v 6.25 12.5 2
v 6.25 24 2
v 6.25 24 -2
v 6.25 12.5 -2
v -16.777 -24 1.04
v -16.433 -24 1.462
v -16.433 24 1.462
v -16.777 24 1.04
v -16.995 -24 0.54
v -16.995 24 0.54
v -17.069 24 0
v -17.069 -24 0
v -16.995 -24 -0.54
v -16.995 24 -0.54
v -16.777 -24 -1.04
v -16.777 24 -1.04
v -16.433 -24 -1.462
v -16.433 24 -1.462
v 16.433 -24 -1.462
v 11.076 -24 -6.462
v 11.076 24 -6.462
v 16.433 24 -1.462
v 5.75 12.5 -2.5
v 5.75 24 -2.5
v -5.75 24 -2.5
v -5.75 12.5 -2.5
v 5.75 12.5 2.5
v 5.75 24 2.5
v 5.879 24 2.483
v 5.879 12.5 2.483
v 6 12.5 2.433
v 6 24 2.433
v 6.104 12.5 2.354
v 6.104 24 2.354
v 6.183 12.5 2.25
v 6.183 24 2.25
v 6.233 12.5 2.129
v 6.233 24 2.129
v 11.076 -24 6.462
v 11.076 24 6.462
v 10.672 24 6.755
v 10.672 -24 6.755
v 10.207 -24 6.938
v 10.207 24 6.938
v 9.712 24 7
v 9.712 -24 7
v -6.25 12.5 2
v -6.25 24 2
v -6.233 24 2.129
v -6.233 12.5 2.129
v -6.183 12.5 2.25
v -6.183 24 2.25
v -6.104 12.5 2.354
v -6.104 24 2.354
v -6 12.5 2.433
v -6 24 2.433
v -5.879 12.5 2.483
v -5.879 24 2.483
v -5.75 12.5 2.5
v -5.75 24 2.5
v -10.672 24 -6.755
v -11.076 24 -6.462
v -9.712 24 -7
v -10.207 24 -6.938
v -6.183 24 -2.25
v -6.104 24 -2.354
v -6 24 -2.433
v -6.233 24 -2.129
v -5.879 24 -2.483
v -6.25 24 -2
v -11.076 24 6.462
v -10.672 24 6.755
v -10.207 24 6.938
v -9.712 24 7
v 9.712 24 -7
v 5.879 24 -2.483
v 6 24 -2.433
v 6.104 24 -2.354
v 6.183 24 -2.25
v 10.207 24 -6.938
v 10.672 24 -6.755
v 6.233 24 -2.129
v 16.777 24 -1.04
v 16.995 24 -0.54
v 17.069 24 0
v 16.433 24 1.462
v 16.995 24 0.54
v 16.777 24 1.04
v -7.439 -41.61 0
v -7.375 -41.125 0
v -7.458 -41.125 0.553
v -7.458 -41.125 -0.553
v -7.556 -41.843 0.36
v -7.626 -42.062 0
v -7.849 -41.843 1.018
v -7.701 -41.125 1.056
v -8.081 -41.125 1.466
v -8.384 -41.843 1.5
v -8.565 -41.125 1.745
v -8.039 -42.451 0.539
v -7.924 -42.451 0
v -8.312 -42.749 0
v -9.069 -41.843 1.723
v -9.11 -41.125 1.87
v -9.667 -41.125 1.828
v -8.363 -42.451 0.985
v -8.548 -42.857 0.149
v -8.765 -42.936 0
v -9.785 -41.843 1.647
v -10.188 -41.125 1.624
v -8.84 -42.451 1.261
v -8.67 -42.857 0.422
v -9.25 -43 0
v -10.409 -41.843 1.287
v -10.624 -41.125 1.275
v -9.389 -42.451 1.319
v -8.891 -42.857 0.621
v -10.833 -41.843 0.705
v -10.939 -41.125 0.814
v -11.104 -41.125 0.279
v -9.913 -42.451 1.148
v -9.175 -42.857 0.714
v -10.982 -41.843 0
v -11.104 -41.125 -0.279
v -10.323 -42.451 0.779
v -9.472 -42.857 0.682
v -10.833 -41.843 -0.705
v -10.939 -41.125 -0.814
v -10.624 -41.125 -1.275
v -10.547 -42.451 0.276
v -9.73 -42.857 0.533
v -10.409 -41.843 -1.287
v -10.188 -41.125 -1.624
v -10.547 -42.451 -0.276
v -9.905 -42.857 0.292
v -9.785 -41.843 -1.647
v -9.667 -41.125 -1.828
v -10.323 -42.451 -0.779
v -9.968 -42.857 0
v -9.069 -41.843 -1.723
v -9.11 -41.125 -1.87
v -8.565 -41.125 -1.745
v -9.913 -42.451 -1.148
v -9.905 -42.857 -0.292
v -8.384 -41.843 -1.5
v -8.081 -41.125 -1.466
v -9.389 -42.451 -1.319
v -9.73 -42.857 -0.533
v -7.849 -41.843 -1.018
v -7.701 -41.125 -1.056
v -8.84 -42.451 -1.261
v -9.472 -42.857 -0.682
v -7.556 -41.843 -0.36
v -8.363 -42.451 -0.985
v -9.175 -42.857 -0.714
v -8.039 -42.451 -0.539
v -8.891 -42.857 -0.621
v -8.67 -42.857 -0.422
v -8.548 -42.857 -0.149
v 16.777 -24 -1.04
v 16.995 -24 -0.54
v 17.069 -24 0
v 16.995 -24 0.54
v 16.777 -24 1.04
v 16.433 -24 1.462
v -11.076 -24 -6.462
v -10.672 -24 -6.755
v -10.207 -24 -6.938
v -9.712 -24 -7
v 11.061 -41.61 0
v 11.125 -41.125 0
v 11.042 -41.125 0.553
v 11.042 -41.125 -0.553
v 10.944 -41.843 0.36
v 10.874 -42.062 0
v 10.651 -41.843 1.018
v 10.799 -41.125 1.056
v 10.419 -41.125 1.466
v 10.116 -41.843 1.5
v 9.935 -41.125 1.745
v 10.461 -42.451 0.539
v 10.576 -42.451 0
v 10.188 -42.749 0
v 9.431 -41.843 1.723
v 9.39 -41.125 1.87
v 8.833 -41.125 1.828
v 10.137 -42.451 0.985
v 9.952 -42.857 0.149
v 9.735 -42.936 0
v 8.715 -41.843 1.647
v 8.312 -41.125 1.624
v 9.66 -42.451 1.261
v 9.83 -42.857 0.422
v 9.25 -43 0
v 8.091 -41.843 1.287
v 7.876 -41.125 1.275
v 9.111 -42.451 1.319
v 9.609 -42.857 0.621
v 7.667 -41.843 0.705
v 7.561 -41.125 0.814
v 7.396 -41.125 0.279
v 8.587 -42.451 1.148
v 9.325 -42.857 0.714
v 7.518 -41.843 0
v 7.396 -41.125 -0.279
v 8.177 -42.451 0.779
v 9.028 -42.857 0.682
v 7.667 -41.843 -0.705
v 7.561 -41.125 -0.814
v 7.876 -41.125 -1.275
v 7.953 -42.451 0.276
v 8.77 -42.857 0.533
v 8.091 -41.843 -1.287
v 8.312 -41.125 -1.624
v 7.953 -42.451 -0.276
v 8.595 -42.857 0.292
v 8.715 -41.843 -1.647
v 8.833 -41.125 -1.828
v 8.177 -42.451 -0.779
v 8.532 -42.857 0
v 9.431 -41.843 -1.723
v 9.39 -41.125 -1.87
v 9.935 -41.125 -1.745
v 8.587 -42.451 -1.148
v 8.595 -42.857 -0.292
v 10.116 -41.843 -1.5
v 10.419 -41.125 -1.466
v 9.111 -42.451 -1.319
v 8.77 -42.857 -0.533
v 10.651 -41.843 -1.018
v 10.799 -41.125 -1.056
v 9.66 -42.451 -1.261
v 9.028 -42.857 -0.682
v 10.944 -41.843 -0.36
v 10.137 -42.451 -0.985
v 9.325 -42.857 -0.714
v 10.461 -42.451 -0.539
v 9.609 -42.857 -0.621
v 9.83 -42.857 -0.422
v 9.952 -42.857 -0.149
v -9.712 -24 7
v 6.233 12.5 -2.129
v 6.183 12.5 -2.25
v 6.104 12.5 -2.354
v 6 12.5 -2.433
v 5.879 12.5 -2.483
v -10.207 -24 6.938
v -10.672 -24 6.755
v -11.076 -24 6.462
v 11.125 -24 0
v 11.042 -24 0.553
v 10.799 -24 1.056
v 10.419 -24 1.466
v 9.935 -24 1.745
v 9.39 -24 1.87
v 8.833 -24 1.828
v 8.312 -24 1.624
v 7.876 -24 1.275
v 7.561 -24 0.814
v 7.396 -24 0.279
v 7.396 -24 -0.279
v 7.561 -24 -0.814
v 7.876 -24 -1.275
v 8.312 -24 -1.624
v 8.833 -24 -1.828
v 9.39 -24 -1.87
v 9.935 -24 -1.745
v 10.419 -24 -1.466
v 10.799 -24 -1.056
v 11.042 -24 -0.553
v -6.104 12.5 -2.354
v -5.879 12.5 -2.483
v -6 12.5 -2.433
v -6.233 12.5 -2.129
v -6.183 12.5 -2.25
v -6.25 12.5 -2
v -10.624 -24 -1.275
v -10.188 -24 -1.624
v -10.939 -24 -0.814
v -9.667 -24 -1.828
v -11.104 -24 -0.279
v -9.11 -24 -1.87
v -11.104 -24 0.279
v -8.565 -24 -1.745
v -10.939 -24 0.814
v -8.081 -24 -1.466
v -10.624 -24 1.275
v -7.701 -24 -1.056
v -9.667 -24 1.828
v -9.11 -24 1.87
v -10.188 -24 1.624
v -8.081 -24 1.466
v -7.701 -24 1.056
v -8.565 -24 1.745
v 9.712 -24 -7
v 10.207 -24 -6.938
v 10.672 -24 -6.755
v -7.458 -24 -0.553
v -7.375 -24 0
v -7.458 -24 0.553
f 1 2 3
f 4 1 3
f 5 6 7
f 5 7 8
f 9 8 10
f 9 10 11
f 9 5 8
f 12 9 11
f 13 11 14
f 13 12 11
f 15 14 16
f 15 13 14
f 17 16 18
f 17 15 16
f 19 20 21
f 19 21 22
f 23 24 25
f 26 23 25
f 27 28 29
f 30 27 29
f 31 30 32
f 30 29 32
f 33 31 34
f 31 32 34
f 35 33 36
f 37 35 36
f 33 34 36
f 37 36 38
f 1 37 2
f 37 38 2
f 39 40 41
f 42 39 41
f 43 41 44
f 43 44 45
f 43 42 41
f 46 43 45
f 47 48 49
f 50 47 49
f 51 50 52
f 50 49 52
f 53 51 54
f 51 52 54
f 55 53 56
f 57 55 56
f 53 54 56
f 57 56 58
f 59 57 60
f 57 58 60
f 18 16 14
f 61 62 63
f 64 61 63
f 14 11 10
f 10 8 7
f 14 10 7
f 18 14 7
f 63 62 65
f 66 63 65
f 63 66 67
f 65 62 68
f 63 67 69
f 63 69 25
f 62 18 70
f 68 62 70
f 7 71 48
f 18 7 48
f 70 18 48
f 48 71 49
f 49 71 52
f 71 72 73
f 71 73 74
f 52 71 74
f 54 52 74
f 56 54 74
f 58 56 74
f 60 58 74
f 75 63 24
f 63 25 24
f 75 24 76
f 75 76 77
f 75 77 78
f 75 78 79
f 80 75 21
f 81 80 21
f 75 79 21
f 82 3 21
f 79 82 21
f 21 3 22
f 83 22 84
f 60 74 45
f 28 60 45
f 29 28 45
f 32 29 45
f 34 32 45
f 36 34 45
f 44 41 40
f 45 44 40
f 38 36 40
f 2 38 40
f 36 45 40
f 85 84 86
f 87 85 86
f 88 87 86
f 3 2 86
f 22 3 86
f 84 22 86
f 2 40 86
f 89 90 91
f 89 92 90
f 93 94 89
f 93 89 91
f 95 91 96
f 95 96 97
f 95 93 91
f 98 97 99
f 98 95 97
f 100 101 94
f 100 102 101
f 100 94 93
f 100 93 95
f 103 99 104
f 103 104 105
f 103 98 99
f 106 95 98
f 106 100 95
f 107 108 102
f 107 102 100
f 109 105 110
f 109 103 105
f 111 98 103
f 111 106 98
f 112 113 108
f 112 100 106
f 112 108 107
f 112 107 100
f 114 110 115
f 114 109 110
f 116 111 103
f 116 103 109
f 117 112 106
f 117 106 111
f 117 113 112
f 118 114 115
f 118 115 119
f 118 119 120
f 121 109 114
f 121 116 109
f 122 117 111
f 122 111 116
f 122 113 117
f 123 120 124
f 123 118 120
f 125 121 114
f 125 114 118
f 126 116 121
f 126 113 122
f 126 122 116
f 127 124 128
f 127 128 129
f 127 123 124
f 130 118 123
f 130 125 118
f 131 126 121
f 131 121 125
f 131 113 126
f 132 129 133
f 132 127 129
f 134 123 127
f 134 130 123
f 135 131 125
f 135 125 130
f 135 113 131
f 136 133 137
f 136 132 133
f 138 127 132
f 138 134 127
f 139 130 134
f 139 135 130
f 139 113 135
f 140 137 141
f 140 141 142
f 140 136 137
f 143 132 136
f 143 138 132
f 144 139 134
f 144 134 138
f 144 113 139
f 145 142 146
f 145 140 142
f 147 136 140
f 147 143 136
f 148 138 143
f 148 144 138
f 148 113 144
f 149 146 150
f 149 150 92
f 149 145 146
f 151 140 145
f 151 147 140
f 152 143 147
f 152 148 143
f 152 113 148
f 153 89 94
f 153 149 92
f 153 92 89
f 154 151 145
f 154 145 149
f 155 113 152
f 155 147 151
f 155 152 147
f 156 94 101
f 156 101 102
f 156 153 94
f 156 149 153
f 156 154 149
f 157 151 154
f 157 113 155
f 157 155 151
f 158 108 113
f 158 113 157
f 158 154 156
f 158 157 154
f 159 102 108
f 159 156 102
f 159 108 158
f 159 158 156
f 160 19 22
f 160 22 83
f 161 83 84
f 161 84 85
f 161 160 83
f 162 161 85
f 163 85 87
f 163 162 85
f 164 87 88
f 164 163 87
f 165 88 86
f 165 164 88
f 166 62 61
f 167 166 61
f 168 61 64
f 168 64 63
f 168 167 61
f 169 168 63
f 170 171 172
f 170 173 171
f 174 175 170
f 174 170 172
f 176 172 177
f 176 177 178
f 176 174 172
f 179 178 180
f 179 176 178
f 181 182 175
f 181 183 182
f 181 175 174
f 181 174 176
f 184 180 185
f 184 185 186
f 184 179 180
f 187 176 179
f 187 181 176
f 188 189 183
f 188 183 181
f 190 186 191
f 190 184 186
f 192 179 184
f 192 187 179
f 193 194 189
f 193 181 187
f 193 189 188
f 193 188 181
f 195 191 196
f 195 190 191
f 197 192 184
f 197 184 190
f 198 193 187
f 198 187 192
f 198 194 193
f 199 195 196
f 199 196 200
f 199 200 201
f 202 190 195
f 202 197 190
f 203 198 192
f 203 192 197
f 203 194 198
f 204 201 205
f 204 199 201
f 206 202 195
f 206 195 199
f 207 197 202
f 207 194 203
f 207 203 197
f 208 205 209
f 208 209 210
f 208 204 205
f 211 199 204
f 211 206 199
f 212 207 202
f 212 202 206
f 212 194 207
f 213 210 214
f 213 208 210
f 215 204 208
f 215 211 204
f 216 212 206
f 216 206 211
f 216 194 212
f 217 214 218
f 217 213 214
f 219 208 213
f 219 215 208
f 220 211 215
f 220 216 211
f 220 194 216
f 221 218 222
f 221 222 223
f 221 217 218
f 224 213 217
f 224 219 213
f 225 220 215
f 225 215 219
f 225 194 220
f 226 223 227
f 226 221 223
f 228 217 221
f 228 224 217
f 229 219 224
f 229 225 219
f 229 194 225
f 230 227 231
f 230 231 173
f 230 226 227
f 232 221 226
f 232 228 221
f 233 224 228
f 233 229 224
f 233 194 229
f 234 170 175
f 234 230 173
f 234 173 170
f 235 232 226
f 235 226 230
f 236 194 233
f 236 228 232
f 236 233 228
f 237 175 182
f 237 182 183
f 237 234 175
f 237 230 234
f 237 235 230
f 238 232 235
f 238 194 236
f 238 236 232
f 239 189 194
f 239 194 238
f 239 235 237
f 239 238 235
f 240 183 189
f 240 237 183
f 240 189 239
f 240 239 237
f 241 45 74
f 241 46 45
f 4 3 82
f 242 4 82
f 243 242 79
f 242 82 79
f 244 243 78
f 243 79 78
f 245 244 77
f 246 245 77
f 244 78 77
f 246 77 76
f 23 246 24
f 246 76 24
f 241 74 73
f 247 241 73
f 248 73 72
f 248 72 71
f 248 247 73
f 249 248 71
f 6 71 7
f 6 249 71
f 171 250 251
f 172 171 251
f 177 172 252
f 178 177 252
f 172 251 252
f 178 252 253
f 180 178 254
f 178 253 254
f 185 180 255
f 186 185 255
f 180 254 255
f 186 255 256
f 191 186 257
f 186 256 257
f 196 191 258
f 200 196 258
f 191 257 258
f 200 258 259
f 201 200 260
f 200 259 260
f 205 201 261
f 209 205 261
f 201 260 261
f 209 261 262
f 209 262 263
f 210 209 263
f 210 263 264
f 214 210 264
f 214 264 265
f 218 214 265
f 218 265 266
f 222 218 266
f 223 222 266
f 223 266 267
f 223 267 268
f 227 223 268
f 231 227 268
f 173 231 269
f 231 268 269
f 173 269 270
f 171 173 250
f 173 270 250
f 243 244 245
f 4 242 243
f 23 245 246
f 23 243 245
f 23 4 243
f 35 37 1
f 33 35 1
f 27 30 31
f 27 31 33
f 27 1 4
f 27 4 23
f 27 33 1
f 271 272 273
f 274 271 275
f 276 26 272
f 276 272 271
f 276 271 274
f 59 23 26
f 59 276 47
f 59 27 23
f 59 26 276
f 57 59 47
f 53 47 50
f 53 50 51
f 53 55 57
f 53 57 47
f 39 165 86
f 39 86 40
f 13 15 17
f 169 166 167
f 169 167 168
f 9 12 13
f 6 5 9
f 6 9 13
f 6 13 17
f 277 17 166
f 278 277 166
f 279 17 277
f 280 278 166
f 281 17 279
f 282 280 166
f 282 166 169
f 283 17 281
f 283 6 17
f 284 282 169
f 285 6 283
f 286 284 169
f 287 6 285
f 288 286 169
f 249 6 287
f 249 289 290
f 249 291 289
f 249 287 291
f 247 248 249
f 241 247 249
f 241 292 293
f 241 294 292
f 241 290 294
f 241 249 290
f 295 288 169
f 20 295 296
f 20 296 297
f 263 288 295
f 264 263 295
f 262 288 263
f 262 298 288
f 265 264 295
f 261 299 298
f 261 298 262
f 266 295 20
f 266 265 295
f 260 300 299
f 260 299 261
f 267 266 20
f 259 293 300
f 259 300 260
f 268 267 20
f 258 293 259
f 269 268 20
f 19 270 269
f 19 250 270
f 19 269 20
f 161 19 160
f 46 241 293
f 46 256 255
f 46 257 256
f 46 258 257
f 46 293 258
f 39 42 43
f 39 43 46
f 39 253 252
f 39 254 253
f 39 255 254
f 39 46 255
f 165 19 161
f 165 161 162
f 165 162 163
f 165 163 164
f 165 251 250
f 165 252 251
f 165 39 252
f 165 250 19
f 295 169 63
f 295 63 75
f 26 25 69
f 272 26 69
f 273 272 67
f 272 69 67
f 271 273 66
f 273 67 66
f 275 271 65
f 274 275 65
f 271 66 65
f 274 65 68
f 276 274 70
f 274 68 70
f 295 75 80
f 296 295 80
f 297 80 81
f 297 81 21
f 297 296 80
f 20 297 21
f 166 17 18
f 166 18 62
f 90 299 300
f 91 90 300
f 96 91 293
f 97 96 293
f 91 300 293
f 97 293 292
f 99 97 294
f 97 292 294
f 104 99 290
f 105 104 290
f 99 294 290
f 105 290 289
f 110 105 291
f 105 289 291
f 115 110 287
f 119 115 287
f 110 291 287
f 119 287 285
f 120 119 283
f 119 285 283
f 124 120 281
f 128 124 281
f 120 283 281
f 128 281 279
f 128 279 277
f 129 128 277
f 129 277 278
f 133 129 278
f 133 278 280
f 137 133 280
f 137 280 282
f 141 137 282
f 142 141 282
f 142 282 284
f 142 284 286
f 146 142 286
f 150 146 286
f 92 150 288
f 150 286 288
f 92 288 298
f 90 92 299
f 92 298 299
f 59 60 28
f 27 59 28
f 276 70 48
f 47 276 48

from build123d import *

# Parameters (mm, degrees)
F1_DEPTH = 24
F2_R     = 1.875
F3_DEPTH = 19
F4_R     = 1.875
F6_DEPTH = 11.5


with BuildPart() as f1:
    # F0 (on Front) → F1 (new body, symmetric)
    with BuildSketch(Plane.XZ):
        with BuildLine():
            Line((-11.07631, 6.462111), (-16.433453, 1.462111))
            ThreePointArc((-16.433453, 1.462111), (-17.068816, 0), (-16.433453, -1.462111))
            Line((-16.433453, -1.462111), (-11.07631, -6.462111))
            ThreePointArc((-11.07631, -6.462111), (-10.445083, -6.860675), (-9.711674, -7))
            Line((-9.711674, -7), (9.711674, -7))
            ThreePointArc((9.711674, -7), (10.445083, -6.860675), (11.07631, -6.462111))
            Line((11.07631, -6.462111), (16.433453, -1.462111))
            ThreePointArc((16.433453, -1.462111), (17.068816, 0), (16.433453, 1.462111))
            Line((16.433453, 1.462111), (11.07631, 6.462111))
            ThreePointArc((11.07631, 6.462111), (10.445083, 6.860675), (9.711674, 7))
            Line((9.711674, 7), (-9.711674, 7))
            ThreePointArc((-9.711674, 7), (-10.445083, 6.860675), (-11.07631, 6.462111))
        make_face()
    extrude(amount=F1_DEPTH, both=True)

    # F2 (on face) → F3 (join)
    with BuildSketch(Plane.XZ.offset(24)):
        with Locations((-9.25, 0)):
            Circle(F2_R)
        with Locations((9.25, 0)):
            Circle(F2_R)
    extrude(amount=F3_DEPTH)

    # F4
    f4_edges = [f1.edges().sort_by_distance(p)[0] for p in [
        (-11.125, -43, 0),
        (7.375, -43, 0),
    ]]
    fillet(f4_edges, radius=F4_R)

    # F5 (on face) → F6 (cut)
    with BuildSketch(Plane(origin=(0, 24, 0), x_dir=(-1, 0, 0), z_dir=(0, 1, 0))):
        with BuildLine():
            ThreePointArc((6.25, 2), (6.103553, 2.353553), (5.75, 2.5))
            Line((5.75, 2.5), (-5.75, 2.5))
            ThreePointArc((-5.75, 2.5), (-6.103553, 2.353553), (-6.25, 2))
            Line((-6.25, 2), (-6.25, -2))
            ThreePointArc((-6.25, -2), (-6.103553, -2.353553), (-5.75, -2.5))
            Line((-5.75, -2.5), (5.75, -2.5))
            ThreePointArc((5.75, -2.5), (6.103553, -2.353553), (6.25, -2))
            Line((6.25, -2), (6.25, 2))
        make_face()
    extrude(amount=-F6_DEPTH, mode=Mode.SUBTRACT)


solid = f1.part
